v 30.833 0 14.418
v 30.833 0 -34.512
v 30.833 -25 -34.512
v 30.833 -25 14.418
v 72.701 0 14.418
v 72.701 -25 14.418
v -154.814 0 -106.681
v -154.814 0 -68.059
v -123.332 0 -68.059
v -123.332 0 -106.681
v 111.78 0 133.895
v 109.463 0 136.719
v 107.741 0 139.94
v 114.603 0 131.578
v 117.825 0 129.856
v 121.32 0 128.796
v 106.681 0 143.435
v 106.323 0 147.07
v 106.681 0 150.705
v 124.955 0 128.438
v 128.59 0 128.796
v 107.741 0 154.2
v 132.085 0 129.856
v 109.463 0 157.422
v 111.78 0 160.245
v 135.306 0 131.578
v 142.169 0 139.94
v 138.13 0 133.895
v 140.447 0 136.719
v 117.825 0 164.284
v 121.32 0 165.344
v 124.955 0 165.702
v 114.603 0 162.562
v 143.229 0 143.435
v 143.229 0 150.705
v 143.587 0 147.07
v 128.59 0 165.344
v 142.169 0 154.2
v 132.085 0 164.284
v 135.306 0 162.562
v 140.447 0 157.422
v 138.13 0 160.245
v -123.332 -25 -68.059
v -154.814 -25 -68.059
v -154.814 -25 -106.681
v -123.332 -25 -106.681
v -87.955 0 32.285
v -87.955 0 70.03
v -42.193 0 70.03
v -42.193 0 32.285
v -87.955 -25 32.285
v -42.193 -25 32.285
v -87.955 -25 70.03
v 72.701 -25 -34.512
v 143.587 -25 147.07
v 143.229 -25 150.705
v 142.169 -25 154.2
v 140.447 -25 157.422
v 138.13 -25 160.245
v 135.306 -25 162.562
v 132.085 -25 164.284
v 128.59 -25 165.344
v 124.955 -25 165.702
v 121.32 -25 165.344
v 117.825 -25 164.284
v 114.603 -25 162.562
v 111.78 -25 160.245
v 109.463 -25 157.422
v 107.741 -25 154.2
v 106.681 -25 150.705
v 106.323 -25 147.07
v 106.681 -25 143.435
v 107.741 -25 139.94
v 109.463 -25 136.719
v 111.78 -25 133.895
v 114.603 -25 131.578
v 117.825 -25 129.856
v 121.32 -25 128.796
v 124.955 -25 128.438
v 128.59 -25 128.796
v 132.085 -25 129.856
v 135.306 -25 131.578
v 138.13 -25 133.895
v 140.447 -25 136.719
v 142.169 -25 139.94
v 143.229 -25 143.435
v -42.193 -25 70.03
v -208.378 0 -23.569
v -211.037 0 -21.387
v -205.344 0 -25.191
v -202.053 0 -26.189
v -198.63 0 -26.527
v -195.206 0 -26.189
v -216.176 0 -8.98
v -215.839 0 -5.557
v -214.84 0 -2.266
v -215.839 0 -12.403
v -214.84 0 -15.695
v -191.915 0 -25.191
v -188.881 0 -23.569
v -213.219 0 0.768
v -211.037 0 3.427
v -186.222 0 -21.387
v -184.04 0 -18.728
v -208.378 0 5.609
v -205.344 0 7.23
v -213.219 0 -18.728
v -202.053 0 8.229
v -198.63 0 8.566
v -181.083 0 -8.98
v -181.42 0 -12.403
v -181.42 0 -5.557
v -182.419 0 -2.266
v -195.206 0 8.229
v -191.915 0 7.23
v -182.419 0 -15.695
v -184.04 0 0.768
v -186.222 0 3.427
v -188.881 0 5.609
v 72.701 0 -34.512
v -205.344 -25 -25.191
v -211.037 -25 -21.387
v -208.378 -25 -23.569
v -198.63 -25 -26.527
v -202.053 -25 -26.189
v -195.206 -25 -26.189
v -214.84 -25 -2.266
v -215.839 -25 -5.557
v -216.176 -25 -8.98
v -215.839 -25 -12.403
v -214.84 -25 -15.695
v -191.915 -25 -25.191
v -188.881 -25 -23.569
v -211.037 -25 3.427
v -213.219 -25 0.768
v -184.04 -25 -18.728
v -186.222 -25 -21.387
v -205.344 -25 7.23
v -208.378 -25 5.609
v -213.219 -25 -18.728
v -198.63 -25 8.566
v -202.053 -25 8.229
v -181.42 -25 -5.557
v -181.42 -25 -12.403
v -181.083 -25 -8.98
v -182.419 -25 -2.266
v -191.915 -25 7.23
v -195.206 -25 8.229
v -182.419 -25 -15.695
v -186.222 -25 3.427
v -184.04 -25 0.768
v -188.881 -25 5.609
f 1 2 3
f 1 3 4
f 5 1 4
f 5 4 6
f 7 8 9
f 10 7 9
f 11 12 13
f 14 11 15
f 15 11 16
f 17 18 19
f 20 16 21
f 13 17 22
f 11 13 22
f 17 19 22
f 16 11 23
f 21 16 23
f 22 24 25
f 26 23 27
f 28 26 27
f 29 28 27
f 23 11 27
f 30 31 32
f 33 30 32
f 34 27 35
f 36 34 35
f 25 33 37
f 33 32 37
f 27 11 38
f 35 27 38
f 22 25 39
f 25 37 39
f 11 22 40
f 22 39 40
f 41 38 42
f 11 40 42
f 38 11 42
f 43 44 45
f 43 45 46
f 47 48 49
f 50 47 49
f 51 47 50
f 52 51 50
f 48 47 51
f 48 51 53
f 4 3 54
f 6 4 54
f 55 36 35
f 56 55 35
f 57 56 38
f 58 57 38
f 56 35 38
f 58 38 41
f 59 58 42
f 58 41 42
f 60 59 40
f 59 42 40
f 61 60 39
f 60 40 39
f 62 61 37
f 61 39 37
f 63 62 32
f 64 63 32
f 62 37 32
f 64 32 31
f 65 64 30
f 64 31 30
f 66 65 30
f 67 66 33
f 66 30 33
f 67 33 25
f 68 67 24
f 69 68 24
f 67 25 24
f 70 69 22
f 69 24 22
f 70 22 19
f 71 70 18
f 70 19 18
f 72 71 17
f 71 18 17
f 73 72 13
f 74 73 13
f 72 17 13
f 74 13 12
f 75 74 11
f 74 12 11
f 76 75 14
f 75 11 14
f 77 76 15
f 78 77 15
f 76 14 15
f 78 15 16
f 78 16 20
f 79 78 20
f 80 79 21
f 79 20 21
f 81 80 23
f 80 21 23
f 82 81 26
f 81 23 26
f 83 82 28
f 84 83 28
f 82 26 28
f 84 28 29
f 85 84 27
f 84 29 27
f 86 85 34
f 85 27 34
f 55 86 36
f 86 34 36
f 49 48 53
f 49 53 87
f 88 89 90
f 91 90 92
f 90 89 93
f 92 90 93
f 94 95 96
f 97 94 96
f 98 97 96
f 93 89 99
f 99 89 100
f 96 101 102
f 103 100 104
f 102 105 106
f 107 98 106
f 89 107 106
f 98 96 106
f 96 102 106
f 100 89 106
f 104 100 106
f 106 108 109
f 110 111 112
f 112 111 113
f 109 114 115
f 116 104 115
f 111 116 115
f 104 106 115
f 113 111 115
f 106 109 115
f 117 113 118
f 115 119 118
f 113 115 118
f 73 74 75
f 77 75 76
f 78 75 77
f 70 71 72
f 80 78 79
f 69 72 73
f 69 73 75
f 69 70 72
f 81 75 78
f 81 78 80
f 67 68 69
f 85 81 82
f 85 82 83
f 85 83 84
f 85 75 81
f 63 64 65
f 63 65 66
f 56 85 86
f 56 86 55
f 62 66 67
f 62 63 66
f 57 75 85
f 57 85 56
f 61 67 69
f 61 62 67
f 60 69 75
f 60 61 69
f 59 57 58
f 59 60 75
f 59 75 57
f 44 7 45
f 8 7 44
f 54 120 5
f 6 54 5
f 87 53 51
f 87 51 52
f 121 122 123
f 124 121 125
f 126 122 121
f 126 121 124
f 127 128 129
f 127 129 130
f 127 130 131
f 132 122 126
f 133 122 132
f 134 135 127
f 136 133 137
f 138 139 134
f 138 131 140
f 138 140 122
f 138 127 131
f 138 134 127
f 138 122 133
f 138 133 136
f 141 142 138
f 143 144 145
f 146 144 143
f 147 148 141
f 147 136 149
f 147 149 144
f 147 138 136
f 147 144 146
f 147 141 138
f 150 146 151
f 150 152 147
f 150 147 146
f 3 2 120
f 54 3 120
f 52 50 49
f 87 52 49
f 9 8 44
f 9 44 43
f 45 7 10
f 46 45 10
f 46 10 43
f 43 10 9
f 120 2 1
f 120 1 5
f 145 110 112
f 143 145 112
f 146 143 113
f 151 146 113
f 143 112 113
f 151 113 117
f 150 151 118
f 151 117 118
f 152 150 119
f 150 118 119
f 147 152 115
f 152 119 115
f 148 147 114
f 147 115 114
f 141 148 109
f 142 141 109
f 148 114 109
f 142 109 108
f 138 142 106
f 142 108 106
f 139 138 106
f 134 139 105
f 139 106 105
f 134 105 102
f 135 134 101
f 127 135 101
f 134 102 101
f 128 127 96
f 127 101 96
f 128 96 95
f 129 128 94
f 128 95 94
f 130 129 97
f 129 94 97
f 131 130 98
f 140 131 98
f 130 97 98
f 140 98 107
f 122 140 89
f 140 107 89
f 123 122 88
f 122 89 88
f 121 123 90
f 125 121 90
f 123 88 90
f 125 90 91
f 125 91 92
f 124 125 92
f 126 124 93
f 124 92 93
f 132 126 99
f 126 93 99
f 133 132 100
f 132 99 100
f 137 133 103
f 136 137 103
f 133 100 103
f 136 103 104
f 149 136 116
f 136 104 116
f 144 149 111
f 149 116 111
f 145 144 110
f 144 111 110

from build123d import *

# Parameters (mm, degrees)
F0_W     = 45.762677
F0_H     = 37.745066
F0_W_2   = 41.867979
F0_H_2   = 48.930663
F0_W_3   = 31.48213
F0_H_3   = 38.621918
F0_R     = 18.632103
F0_R_2   = 17.546271
F1_DEPTH = 25


with BuildPart() as f1:
    # F0 (on Front) → F1 (new body)
    with BuildSketch(Plane.XZ):
        with Locations((-65.073883, 51.157039)):
            Rectangle(F0_W, F0_H)
        with Locations((51.767002, -10.047117)):
            Rectangle(F0_W_2, F0_H_2)
        with Locations((-139.073104, -87.370135)):
            Rectangle(F0_W_3, F0_H_3)
        with Locations((124.954827, 147.070184)):
            Circle(F0_R)
        with Locations((-198.629513, -8.980257)):
            Circle(F0_R_2)
    extrude(amount=F1_DEPTH)


solid = f1.part
